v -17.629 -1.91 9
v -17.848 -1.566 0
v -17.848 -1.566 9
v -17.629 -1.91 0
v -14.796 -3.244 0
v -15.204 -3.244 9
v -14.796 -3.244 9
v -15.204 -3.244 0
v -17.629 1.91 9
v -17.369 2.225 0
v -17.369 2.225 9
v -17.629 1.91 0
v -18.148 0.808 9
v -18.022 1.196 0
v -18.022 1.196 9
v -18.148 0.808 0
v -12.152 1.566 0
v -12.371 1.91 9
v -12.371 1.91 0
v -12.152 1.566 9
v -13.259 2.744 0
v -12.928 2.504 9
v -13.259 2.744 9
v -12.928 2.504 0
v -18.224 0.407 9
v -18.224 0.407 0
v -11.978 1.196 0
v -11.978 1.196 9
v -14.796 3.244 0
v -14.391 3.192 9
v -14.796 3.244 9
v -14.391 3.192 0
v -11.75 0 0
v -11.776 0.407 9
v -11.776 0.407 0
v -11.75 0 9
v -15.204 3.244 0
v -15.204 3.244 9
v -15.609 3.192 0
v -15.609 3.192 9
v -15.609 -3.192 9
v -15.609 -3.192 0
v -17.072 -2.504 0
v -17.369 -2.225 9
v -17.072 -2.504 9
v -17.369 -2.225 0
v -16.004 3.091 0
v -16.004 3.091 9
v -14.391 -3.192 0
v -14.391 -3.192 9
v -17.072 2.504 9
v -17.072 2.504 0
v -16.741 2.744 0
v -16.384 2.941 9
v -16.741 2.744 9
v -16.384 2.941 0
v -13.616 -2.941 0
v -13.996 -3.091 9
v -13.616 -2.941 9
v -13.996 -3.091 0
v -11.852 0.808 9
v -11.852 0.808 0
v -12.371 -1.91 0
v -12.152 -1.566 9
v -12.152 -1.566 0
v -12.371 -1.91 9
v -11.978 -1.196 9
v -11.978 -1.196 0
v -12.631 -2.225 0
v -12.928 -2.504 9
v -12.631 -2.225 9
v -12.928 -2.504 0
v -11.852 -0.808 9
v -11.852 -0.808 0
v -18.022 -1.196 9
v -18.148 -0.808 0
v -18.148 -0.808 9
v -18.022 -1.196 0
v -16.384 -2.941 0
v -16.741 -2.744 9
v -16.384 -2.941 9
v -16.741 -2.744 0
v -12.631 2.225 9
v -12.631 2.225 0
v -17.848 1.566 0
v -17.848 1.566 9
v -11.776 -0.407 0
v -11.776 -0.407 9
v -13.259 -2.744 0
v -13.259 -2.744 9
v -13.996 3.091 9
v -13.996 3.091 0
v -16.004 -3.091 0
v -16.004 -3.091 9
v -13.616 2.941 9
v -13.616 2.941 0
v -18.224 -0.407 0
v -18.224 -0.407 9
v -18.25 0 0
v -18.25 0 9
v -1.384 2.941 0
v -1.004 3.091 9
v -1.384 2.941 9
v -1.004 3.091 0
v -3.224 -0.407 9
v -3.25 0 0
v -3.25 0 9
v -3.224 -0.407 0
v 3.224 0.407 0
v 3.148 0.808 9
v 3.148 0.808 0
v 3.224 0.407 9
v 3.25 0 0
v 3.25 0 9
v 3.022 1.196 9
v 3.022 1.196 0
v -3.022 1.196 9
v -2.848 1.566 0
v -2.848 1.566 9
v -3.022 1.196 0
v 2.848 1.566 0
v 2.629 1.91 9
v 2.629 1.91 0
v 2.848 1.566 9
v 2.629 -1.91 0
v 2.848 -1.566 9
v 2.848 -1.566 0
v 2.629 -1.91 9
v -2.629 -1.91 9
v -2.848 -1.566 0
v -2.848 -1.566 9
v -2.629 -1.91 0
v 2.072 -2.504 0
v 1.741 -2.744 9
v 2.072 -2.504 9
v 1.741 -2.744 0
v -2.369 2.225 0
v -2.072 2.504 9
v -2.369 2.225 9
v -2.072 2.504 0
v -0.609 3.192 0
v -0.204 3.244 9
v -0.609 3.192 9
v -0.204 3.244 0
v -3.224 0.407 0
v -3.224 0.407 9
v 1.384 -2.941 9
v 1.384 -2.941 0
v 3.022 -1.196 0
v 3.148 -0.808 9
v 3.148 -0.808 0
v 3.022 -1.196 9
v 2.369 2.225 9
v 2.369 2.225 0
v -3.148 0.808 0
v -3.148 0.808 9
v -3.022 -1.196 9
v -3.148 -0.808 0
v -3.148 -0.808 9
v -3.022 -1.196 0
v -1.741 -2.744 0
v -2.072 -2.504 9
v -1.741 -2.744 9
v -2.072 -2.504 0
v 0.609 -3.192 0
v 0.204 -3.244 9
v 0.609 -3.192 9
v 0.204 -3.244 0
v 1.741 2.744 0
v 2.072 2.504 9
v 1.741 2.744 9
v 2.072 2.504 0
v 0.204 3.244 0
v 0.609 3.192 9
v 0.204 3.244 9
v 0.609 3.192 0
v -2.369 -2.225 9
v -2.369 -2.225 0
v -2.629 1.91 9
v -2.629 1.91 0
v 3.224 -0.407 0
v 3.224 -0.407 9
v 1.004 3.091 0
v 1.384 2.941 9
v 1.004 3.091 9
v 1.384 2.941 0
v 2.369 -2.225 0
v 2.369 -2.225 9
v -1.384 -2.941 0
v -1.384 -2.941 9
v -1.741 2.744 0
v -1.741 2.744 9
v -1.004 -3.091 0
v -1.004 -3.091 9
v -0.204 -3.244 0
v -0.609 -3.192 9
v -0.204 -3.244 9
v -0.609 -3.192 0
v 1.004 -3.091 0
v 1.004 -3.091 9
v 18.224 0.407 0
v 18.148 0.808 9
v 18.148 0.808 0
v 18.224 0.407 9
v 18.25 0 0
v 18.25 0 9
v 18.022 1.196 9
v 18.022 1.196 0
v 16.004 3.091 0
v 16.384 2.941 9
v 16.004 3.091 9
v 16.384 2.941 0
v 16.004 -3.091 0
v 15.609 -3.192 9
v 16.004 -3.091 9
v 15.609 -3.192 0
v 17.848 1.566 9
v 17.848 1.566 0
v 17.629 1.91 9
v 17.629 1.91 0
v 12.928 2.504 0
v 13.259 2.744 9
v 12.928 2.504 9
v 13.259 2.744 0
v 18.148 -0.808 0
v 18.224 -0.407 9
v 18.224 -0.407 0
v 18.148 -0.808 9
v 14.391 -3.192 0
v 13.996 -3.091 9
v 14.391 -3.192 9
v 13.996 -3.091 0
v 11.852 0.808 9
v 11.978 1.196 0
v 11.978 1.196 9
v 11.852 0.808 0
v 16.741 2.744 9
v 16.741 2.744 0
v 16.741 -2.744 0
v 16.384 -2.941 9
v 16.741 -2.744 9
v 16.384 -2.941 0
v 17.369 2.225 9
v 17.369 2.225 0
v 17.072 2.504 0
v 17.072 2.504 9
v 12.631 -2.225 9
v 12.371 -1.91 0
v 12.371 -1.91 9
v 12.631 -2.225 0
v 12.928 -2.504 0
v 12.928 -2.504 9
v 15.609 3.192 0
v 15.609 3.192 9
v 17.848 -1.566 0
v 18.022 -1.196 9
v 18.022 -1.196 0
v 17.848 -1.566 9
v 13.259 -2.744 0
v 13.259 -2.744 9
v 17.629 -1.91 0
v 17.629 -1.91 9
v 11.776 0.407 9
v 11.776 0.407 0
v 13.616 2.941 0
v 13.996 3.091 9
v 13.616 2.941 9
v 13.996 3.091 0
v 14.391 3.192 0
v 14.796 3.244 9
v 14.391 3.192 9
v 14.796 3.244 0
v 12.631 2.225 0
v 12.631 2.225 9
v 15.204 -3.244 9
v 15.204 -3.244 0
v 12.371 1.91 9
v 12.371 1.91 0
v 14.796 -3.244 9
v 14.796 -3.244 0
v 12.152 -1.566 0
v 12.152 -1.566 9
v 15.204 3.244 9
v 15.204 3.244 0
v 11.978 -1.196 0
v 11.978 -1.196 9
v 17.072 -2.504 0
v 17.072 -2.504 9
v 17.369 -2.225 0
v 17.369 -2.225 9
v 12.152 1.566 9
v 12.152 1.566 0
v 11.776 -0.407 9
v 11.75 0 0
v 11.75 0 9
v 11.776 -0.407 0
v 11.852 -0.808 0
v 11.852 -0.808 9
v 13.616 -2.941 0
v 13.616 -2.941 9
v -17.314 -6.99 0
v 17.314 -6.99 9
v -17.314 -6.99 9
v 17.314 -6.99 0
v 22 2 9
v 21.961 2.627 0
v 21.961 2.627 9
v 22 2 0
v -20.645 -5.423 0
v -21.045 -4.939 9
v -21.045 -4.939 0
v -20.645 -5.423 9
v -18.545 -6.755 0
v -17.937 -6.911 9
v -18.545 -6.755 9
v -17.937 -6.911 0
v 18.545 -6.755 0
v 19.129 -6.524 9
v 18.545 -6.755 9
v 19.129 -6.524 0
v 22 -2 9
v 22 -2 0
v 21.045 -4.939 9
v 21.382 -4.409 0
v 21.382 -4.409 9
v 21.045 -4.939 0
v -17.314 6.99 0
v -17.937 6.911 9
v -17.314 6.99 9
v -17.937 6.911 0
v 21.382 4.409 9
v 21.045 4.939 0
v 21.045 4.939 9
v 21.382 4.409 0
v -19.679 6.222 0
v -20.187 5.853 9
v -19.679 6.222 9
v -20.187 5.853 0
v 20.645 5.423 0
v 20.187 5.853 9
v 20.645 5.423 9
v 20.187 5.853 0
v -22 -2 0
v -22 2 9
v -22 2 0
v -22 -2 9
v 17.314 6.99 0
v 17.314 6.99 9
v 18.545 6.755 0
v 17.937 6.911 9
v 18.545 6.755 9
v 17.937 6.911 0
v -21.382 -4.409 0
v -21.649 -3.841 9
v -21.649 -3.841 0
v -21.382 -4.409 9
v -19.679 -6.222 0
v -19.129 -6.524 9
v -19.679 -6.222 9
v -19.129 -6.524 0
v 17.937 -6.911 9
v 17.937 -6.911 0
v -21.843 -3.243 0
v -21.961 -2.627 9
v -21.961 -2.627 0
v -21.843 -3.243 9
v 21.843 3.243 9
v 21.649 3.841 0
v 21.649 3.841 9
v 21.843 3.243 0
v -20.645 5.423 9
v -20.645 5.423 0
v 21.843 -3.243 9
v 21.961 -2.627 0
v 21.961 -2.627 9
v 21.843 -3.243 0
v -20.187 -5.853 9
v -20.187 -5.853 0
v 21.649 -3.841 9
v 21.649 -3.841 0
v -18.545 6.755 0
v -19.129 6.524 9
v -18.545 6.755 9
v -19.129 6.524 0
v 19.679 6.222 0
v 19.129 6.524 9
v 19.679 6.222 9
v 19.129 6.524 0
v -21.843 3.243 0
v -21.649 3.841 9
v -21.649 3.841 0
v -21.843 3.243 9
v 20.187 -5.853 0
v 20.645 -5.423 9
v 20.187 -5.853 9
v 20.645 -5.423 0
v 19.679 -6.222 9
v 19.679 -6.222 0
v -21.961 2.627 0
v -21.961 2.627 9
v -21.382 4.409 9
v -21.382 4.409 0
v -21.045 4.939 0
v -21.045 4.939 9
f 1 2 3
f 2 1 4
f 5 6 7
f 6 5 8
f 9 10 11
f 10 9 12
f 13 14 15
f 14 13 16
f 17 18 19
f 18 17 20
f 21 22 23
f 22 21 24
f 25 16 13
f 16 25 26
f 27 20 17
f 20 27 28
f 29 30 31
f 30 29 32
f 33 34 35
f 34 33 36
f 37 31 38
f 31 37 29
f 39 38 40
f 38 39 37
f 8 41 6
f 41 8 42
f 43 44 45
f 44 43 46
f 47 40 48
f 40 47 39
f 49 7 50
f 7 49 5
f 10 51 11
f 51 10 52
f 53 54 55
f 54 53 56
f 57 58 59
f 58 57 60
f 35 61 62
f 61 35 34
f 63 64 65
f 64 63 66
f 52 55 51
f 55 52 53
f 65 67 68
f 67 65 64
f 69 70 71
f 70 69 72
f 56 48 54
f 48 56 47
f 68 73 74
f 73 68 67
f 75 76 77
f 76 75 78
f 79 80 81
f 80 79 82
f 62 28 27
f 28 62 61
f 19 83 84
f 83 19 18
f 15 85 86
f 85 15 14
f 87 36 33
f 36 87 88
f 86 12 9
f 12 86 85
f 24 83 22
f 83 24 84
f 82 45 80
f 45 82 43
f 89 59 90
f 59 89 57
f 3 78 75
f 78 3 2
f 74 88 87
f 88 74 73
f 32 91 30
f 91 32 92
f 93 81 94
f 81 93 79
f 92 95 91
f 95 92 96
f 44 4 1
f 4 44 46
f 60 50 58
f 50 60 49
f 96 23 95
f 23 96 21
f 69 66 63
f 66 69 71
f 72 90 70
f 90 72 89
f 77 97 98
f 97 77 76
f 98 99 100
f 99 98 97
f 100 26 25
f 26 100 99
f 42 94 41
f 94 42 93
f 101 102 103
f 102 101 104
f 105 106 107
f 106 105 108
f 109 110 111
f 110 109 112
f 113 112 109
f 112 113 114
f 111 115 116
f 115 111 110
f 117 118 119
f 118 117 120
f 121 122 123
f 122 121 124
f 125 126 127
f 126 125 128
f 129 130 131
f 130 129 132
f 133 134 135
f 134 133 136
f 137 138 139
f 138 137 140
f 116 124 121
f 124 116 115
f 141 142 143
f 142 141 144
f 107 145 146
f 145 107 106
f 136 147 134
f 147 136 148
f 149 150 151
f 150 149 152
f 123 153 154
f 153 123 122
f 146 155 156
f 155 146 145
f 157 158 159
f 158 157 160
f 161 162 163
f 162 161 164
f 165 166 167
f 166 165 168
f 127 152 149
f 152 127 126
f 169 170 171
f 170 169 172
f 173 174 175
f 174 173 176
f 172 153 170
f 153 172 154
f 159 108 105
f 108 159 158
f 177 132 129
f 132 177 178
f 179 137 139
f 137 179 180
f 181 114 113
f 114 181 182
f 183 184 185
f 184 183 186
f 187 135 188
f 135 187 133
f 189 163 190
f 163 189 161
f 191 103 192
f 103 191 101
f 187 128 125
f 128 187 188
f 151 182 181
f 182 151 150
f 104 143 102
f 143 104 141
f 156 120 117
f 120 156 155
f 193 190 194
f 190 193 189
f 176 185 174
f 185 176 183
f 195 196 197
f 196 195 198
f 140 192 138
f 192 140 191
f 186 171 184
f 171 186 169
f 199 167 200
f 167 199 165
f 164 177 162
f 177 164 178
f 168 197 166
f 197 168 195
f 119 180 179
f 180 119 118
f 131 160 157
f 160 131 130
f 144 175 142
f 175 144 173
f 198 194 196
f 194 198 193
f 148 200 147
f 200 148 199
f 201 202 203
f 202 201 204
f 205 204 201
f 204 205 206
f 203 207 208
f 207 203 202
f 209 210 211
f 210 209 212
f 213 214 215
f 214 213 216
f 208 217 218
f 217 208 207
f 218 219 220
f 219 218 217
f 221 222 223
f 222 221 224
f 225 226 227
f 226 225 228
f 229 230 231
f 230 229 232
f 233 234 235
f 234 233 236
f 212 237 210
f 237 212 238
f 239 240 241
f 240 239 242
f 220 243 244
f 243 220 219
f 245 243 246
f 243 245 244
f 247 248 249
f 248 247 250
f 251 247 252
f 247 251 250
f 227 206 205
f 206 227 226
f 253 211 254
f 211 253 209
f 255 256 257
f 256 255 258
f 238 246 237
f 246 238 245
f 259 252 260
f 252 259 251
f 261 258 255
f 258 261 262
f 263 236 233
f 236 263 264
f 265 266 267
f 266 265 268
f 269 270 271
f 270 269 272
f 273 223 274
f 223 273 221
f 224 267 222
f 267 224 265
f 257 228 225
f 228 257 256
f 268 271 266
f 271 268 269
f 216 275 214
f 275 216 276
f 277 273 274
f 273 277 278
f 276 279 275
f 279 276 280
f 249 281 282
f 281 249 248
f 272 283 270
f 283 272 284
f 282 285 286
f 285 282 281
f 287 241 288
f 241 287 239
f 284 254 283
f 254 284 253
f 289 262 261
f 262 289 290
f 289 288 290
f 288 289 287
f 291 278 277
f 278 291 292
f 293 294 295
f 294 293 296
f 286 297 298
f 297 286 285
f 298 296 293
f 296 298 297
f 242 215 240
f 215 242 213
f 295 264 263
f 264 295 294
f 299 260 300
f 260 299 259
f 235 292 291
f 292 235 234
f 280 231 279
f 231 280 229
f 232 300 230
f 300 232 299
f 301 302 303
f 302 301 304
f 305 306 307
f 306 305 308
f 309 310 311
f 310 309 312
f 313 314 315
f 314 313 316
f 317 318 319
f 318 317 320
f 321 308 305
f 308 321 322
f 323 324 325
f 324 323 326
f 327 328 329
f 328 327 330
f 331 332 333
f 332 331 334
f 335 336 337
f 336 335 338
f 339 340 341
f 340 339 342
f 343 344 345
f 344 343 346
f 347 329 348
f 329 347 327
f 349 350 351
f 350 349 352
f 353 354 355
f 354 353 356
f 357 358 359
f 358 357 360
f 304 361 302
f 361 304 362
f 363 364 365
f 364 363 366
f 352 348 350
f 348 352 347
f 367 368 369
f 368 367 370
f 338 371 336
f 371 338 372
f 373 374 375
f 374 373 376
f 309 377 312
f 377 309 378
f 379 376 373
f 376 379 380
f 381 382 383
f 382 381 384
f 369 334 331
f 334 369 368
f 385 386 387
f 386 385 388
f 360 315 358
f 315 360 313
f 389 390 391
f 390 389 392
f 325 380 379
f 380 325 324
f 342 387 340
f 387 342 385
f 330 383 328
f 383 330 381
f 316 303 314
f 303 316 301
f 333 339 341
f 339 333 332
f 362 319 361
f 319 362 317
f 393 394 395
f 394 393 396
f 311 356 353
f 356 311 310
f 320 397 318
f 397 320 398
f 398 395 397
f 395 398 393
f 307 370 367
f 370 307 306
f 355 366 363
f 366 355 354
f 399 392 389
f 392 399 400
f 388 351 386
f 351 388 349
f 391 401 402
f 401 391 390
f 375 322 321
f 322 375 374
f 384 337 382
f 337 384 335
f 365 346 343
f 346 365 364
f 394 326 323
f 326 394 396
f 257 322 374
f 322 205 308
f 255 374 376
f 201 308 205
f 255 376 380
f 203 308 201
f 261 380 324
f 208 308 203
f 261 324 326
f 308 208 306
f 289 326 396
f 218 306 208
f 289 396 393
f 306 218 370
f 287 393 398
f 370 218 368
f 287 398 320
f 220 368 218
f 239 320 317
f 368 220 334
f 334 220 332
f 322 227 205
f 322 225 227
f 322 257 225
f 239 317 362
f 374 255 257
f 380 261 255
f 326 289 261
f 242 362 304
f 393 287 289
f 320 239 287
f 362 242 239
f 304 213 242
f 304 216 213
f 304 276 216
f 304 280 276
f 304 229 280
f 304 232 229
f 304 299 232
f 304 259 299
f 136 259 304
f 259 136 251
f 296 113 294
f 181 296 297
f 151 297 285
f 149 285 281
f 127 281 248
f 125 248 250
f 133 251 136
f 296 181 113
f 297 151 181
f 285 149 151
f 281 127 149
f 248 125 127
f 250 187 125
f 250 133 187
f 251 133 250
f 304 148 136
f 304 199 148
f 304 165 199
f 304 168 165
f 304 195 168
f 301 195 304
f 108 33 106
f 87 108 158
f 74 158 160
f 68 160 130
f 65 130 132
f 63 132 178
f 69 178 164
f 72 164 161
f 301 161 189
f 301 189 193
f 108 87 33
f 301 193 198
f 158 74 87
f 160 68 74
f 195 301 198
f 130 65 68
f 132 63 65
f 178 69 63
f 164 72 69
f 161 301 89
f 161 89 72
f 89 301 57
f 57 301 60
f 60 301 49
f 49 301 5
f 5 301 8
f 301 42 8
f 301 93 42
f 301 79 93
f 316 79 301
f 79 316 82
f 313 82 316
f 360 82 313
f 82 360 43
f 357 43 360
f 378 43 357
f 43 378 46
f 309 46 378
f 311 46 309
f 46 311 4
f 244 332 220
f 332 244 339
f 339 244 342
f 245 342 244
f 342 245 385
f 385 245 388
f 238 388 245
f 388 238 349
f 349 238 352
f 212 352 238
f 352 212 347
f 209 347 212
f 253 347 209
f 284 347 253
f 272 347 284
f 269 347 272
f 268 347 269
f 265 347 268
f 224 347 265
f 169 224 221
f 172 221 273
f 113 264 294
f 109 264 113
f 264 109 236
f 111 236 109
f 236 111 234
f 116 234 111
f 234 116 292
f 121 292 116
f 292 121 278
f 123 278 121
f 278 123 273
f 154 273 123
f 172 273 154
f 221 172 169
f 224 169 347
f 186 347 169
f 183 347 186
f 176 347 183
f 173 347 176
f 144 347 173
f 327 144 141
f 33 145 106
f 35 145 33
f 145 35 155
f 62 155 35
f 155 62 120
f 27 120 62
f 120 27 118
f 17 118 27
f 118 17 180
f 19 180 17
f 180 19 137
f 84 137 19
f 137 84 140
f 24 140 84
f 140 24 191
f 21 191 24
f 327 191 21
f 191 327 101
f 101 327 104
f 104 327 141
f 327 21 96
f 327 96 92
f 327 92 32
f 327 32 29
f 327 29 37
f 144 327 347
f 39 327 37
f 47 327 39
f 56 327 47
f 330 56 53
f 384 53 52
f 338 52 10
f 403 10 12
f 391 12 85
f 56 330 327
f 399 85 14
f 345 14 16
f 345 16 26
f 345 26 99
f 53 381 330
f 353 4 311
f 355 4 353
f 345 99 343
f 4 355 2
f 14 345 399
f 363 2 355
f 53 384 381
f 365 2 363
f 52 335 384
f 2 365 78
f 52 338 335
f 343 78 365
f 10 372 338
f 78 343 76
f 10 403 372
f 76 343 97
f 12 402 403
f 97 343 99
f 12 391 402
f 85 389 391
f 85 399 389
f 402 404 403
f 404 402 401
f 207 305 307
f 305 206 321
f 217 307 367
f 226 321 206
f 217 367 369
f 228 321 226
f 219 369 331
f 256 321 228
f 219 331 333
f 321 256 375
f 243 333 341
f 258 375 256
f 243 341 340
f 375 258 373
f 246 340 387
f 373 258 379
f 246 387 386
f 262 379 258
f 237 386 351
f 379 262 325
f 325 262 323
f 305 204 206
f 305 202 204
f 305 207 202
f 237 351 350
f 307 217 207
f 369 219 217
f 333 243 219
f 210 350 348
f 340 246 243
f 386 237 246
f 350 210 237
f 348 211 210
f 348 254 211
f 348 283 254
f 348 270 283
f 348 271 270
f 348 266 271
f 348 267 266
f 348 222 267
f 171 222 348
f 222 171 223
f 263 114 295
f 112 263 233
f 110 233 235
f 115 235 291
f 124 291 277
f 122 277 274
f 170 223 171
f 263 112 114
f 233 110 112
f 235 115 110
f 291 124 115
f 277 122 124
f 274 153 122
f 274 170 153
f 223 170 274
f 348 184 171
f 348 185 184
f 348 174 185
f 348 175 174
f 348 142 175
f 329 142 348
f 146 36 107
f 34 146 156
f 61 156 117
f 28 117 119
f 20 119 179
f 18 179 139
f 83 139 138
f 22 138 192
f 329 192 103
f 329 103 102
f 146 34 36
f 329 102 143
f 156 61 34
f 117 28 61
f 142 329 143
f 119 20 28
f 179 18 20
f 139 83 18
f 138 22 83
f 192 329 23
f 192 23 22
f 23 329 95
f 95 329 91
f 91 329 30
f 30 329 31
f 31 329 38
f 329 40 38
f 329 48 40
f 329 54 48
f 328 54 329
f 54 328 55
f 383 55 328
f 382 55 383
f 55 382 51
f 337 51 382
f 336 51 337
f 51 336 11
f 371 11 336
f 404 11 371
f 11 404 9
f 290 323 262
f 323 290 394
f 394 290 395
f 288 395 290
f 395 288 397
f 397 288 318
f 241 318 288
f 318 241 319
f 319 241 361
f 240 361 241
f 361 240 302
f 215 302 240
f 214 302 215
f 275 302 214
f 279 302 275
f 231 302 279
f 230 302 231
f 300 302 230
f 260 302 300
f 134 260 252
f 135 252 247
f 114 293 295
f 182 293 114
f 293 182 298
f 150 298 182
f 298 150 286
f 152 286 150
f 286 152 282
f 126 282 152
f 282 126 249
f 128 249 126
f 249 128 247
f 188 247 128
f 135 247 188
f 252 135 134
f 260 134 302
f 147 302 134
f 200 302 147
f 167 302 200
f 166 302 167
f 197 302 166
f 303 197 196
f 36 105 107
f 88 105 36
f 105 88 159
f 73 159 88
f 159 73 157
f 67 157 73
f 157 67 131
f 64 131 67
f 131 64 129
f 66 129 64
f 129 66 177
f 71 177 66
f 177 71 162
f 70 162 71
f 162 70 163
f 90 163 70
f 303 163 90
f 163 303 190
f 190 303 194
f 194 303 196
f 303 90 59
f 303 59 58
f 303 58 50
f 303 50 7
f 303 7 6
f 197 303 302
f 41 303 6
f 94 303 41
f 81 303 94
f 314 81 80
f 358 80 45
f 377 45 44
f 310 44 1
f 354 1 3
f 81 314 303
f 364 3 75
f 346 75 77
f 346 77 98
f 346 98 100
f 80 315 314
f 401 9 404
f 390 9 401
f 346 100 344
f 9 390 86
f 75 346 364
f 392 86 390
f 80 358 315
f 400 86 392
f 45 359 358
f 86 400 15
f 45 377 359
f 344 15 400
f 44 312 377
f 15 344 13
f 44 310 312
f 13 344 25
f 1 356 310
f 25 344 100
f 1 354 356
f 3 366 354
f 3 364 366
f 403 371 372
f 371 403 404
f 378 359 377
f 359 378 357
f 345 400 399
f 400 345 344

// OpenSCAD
$fn = 50;


difference() {
	union() {
		hull() {
			translate(v = [-17.0000000000, 2.0000000000, 0]) {
				cylinder(h = 9, r = 5);
			}
			translate(v = [17.0000000000, 2.0000000000, 0]) {
				cylinder(h = 9, r = 5);
			}
			translate(v = [-17.0000000000, -2.0000000000, 0]) {
				cylinder(h = 9, r = 5);
			}
			translate(v = [17.0000000000, -2.0000000000, 0]) {
				cylinder(h = 9, r = 5);
			}
		}
	}
	union() {
		translate(v = [-15.0000000000, 0.0000000000, -100.0000000000]) {
			cylinder(h = 200, r = 3.2500000000);
		}
		translate(v = [0.0000000000, 0.0000000000, -100.0000000000]) {
			cylinder(h = 200, r = 3.2500000000);
		}
		translate(v = [15.0000000000, 0.0000000000, -100.0000000000]) {
			cylinder(h = 200, r = 3.2500000000);
		}
	}
}
